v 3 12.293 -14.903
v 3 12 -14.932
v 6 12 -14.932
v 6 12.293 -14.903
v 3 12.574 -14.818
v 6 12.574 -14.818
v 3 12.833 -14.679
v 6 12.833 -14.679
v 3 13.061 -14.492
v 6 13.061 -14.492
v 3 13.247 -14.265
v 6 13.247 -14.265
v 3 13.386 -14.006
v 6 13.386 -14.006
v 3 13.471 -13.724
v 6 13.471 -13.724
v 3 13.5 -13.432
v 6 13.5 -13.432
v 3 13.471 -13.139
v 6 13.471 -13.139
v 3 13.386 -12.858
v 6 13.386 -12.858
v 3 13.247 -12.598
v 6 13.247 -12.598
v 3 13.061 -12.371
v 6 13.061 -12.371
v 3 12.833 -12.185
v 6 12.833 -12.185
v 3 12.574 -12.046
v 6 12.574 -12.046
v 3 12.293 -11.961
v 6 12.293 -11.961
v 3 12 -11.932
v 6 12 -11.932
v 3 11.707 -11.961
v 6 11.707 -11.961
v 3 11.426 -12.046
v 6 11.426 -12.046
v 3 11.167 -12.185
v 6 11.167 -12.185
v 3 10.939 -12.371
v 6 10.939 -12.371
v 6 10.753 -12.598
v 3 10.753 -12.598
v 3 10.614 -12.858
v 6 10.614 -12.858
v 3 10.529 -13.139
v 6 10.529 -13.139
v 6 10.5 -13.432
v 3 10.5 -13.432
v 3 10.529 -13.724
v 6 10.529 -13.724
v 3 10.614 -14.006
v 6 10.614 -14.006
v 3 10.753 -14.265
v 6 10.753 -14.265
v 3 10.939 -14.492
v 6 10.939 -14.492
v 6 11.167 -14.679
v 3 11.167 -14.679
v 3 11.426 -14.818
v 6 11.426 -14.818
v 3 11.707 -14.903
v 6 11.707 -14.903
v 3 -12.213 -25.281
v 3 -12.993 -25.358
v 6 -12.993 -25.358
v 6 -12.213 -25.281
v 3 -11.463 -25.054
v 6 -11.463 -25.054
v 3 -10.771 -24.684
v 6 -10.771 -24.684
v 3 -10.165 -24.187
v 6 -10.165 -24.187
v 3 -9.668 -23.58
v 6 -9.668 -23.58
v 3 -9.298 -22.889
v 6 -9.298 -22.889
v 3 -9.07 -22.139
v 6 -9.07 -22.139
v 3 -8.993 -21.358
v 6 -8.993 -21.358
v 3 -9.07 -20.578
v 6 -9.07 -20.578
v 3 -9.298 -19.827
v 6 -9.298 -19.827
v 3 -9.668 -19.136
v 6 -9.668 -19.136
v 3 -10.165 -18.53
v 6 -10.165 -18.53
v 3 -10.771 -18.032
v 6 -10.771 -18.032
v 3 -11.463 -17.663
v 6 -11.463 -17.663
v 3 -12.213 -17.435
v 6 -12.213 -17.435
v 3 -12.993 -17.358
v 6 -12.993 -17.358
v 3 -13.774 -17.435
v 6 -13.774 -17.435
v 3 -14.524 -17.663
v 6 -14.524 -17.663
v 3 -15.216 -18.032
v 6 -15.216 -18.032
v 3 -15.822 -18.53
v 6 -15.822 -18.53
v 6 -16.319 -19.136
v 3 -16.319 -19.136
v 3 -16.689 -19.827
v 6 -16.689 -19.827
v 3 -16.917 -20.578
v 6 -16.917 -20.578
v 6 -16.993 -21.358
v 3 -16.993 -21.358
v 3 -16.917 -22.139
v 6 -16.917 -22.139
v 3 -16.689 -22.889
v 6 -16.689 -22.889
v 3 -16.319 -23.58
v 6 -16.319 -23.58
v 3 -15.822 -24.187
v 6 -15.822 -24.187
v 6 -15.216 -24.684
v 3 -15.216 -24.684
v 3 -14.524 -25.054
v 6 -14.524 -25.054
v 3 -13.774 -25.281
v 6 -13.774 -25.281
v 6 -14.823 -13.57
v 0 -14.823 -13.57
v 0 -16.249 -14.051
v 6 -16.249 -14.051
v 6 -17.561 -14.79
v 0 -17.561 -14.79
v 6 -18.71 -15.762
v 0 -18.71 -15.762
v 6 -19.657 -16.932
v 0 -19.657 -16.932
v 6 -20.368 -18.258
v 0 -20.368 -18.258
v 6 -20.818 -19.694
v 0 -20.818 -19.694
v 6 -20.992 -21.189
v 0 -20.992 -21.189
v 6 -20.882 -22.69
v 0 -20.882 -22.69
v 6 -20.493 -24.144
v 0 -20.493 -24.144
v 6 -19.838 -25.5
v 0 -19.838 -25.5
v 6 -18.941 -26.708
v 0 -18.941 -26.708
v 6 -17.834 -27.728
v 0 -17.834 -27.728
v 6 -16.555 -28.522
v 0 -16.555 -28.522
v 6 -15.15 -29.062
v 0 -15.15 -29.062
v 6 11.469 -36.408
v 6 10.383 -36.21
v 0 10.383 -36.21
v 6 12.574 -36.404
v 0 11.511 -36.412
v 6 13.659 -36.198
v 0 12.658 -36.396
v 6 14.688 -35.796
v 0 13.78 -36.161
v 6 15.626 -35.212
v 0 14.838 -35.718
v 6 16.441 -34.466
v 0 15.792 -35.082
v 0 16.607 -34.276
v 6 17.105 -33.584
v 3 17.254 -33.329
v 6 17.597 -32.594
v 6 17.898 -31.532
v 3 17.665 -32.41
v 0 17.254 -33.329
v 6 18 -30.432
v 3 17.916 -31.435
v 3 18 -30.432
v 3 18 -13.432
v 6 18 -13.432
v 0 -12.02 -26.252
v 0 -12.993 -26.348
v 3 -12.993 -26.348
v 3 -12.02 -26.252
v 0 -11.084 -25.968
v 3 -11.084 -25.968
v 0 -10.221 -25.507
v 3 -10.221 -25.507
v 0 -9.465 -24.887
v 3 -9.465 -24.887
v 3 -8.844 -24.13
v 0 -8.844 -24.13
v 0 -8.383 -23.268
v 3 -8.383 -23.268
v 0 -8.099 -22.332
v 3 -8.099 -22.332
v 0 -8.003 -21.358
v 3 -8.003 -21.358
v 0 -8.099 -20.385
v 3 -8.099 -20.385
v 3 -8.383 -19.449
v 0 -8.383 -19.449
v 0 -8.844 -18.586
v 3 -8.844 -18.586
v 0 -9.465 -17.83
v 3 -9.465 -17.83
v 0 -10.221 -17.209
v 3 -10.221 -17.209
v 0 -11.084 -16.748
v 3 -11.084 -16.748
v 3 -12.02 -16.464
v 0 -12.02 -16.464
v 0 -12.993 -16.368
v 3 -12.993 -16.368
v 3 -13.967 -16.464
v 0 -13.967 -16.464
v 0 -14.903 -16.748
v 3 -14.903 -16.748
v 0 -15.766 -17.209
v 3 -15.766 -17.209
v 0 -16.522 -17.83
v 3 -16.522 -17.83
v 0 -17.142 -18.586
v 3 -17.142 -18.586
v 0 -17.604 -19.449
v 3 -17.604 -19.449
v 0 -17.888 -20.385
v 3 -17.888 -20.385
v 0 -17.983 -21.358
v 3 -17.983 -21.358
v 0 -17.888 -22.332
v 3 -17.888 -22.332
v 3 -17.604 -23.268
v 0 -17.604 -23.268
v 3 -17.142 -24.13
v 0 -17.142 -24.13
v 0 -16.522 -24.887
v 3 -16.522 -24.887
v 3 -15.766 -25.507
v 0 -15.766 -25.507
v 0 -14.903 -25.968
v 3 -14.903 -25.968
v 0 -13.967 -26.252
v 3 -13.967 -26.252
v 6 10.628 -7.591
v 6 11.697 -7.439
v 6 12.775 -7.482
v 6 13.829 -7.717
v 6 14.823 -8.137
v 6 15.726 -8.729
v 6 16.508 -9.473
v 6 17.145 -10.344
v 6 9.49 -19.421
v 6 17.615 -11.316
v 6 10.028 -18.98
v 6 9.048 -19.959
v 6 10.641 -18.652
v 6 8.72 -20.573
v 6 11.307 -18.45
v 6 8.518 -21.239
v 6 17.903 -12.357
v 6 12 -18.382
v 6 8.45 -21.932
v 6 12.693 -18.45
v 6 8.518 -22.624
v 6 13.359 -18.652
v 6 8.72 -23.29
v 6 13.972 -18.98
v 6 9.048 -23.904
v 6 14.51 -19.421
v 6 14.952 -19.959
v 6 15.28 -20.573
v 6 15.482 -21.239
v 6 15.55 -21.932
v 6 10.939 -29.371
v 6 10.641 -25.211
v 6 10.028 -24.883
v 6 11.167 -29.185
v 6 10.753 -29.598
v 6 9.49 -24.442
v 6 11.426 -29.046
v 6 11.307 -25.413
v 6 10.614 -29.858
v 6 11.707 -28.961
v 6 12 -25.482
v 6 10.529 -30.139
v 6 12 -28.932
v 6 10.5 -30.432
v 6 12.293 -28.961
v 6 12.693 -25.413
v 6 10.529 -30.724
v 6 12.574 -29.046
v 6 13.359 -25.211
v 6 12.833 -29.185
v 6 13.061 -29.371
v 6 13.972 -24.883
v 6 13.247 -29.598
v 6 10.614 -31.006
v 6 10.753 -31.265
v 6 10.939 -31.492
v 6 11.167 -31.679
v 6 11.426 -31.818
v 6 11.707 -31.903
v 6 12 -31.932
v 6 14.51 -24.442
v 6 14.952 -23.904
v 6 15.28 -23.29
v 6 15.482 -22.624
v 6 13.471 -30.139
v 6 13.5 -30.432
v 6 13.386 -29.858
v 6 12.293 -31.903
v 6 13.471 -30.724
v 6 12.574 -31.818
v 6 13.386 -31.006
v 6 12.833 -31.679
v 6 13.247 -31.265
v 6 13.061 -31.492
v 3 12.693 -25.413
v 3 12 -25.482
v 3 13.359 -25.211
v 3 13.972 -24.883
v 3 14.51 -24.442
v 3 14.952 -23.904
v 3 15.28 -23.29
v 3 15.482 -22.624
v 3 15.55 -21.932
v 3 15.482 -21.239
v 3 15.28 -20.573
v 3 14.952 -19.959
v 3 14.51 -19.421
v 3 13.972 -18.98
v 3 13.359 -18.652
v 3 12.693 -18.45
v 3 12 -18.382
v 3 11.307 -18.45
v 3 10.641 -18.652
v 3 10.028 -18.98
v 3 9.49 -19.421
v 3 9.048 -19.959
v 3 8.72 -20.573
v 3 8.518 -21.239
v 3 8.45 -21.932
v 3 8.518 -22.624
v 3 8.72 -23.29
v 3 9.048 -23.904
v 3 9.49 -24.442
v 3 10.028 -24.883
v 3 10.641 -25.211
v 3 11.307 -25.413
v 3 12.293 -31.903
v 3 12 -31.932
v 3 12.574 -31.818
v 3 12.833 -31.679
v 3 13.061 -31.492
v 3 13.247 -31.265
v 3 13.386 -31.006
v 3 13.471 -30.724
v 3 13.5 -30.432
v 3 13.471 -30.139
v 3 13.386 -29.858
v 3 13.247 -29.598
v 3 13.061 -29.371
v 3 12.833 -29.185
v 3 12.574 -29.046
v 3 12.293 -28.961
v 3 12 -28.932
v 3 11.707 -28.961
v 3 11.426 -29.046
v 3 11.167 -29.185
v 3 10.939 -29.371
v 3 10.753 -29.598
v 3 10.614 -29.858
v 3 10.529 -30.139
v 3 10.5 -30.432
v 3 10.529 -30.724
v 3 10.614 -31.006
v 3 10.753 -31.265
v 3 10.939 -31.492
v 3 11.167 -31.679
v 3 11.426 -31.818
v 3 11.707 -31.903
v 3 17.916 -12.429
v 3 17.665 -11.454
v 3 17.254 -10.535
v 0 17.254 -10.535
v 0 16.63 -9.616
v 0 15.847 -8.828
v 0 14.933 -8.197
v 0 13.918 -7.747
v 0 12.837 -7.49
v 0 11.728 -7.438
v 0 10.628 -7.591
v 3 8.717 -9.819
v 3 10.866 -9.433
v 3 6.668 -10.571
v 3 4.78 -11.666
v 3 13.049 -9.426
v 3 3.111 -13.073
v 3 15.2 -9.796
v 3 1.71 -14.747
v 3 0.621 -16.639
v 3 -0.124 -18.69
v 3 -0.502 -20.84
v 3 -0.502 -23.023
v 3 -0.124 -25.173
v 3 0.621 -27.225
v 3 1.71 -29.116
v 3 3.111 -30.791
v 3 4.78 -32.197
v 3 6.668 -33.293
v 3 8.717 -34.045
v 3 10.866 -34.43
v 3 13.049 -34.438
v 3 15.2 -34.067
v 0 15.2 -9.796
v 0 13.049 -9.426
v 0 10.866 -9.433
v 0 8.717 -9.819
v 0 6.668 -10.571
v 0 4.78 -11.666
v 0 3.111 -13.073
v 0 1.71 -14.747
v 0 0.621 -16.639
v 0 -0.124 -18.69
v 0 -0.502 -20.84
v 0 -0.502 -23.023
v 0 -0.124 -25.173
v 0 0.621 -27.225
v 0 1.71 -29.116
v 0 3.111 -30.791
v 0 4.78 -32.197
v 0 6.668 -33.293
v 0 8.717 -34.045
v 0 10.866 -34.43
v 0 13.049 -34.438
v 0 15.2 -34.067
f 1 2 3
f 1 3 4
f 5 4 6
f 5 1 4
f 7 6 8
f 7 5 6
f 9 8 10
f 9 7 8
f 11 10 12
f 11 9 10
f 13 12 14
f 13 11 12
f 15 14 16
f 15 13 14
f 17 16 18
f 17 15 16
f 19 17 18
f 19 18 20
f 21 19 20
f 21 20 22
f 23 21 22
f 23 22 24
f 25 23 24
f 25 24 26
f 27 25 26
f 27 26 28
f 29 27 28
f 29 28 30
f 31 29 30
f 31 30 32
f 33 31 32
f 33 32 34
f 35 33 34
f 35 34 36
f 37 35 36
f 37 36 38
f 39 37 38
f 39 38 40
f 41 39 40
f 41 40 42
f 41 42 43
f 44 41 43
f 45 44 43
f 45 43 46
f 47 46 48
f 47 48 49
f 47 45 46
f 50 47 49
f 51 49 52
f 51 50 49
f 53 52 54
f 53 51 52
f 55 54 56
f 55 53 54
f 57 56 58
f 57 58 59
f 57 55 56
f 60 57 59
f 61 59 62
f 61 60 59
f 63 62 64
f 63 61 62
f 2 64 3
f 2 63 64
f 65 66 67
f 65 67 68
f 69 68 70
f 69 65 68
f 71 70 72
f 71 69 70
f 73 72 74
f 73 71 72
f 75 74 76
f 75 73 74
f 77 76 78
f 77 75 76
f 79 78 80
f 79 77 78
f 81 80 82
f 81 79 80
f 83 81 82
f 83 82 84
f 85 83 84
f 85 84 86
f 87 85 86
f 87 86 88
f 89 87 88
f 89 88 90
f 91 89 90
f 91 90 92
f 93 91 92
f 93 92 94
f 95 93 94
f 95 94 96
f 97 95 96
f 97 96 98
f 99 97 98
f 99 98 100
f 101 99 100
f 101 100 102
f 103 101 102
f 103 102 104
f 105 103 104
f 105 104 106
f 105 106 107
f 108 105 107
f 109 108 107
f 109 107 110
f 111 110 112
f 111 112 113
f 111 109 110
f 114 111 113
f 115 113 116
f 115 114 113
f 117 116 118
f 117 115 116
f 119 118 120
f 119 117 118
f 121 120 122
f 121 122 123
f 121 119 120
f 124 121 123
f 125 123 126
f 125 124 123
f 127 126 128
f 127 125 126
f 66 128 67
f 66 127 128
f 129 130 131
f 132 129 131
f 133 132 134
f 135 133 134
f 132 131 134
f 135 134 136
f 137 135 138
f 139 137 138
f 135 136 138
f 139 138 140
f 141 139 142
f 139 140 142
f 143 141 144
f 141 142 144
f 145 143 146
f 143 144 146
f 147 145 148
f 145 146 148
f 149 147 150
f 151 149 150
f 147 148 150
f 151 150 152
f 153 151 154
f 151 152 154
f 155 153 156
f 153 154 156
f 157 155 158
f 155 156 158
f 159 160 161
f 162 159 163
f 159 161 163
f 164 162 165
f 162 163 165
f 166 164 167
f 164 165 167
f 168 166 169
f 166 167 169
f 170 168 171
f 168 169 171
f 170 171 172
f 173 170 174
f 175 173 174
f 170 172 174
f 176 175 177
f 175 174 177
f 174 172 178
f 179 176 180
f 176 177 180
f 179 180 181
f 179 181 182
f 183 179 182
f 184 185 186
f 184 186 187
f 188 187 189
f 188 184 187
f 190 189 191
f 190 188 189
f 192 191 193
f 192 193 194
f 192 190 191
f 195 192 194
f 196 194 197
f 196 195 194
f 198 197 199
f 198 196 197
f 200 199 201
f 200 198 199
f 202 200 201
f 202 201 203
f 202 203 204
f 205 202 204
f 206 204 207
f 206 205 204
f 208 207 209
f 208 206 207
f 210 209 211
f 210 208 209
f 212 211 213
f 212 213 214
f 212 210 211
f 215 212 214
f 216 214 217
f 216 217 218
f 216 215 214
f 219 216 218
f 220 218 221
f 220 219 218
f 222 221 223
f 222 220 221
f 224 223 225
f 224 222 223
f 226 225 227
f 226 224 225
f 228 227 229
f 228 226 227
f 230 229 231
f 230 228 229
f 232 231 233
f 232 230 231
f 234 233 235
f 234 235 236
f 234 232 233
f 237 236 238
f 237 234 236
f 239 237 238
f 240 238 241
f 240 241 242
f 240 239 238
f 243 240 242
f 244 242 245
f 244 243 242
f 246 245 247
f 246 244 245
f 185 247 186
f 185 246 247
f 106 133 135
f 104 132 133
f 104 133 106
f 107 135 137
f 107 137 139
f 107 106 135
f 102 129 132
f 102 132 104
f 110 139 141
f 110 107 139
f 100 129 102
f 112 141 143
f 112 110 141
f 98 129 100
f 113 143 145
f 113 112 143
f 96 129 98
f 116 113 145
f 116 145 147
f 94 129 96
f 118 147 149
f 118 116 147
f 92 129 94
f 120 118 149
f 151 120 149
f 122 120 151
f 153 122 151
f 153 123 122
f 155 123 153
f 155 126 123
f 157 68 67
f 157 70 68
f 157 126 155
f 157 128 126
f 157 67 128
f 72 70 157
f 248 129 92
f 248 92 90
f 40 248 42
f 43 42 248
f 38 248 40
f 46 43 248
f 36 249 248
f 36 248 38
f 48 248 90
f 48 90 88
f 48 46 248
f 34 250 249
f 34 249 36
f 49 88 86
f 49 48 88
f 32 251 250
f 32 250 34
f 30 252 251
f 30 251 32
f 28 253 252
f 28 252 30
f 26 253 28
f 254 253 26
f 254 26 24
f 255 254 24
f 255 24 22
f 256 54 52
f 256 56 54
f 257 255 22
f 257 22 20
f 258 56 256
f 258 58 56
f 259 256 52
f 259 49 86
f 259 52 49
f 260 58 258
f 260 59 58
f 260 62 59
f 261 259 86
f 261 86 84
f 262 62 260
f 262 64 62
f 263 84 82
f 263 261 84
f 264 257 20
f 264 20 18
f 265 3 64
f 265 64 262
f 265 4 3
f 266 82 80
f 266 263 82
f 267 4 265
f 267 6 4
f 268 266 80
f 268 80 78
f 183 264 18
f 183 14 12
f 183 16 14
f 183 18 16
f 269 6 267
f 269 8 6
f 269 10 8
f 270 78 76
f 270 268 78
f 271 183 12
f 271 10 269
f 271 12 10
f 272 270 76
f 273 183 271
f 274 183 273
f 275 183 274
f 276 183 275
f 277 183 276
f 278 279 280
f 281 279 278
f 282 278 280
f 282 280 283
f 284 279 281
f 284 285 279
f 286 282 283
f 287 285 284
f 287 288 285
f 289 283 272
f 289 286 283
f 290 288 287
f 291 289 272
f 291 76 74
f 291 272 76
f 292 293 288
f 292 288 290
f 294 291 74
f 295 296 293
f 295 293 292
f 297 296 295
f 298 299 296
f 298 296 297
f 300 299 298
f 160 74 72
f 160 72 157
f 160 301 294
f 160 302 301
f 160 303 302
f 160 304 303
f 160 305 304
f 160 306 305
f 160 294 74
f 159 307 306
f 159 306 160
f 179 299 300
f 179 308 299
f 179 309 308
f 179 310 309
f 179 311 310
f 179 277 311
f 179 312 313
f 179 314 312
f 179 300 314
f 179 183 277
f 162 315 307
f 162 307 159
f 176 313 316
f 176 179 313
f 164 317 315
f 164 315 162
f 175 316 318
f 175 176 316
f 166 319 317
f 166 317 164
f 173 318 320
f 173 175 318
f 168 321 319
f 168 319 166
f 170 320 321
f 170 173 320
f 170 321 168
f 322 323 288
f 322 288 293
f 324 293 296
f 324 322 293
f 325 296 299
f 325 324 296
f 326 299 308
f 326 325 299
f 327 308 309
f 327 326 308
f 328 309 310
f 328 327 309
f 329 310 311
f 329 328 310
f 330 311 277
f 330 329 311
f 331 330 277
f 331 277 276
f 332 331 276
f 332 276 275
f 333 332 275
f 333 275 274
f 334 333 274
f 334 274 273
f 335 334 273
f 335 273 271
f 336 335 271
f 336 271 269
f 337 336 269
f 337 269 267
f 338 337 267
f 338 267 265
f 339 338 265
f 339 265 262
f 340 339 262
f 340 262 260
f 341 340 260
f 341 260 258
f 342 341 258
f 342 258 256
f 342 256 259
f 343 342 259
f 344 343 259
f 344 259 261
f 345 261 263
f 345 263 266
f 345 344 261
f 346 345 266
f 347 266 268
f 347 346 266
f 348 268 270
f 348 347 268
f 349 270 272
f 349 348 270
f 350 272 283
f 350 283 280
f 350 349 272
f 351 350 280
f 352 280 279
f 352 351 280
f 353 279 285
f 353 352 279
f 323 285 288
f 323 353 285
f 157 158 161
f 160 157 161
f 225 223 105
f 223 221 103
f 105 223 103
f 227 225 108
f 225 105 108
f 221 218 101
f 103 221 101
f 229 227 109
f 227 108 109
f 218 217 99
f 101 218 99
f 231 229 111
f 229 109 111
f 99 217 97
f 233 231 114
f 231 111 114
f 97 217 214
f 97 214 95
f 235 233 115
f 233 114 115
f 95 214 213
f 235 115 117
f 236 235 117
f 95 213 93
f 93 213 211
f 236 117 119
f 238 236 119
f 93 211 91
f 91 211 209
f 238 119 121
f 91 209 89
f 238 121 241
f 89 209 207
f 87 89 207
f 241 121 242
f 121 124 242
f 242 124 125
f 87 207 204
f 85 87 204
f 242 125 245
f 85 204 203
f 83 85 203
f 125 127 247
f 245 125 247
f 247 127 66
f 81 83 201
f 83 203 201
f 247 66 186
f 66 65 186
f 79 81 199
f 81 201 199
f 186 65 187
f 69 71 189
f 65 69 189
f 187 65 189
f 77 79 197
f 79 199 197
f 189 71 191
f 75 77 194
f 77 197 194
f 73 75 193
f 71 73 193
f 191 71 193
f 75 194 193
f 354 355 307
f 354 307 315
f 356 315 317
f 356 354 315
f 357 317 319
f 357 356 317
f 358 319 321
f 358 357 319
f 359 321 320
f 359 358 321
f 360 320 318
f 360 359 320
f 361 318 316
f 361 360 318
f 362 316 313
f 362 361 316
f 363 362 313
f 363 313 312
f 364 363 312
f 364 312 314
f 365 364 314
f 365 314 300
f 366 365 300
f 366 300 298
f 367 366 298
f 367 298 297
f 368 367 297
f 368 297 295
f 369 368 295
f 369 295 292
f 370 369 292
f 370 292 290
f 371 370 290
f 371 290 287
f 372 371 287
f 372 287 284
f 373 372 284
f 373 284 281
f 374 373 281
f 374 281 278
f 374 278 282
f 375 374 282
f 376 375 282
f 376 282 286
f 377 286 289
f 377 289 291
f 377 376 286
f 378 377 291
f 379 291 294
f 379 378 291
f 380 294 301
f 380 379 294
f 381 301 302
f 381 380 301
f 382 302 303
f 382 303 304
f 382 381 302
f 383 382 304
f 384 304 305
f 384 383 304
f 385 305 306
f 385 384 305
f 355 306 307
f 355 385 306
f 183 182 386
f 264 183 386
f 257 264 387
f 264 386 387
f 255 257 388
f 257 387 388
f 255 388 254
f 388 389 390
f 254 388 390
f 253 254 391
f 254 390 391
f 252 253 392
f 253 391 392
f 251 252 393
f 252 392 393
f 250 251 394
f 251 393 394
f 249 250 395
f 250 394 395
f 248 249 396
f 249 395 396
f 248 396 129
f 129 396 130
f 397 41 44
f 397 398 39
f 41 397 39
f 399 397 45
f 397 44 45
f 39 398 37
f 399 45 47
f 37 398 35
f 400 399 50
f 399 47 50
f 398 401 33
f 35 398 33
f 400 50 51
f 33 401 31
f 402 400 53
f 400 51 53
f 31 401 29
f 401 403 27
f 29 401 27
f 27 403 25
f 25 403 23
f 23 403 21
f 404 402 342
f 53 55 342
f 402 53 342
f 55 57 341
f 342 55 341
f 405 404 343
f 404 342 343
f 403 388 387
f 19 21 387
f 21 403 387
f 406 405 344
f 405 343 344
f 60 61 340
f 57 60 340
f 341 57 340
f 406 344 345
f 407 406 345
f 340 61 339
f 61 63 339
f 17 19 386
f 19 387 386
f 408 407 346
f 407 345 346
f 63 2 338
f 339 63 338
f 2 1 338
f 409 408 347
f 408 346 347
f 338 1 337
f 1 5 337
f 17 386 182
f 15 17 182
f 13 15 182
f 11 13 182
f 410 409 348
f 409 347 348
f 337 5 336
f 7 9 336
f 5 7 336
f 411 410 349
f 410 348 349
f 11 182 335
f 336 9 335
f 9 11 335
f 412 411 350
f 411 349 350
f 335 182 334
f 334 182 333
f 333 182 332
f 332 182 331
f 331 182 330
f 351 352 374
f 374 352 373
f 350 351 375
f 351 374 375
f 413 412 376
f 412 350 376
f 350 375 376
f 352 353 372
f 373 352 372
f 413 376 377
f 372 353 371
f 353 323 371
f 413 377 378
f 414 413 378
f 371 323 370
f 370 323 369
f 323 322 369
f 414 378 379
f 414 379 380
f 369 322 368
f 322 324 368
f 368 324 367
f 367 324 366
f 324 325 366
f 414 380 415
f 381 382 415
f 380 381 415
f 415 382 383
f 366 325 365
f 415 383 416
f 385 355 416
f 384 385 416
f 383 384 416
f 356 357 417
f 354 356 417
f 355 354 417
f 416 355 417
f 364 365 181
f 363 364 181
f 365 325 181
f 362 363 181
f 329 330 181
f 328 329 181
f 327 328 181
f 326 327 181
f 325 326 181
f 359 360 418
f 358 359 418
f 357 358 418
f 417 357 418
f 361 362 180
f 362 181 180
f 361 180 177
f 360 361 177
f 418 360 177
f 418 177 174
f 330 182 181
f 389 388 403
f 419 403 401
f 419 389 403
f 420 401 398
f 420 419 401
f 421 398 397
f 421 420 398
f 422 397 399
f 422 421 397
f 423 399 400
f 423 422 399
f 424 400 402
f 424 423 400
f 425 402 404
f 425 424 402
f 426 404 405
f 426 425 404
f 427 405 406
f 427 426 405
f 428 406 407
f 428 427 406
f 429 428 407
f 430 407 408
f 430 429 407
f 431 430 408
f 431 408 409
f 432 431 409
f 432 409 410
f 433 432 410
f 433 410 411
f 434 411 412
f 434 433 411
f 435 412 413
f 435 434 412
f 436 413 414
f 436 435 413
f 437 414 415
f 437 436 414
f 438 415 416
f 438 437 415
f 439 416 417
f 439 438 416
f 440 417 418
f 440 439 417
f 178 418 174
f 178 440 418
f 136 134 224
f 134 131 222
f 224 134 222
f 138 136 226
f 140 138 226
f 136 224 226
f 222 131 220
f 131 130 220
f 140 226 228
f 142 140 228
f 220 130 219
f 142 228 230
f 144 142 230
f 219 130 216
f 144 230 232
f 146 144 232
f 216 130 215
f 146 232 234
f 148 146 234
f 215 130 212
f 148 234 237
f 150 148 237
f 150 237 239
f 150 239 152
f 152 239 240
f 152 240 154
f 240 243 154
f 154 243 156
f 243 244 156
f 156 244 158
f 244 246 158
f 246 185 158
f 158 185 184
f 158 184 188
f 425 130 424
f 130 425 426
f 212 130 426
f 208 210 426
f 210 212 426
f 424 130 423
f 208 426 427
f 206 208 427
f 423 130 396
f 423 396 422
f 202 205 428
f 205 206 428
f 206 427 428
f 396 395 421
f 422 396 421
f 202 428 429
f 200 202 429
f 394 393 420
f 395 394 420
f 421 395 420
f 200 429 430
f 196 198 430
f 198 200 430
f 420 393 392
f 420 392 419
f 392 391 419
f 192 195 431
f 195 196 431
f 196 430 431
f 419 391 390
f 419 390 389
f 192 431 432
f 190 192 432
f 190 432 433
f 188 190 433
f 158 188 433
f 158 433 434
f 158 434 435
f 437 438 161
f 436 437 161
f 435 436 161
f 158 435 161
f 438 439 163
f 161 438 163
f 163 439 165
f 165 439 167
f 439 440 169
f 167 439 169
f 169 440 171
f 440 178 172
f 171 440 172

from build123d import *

# Parameters (mm, degrees)
SKETCH1_R           = 3.55
SKETCH1_R_2         = 1.5
SKETCH1_R_3         = 4
BOSS_EXTRUDE1_DEPTH = 6
SKETCH2_R           = 4.99
CUT_EXTRUDE1_DEPTH  = 3
SKETCH3_R           = 12.55
CUT_EXTRUDE2_DEPTH  = 3


with BuildPart() as part:
    # Sketch1 → Boss-Extrude1 (new body)
    with BuildSketch(Plane(origin=(0, 0, 0), x_dir=(0, 0, -1), z_dir=(1, 0, 0))):
        with BuildLine():
            Line((30.431712199, 18), (13.431712199, 18))
            ThreePointArc((13.431712199, 18), (8.728856289, 15.726009432), (7.590750373, 10.627715428))
            Line((7.590750373, 10.627715428), (13.570211844, -14.823132675))
            ThreePointArc((13.570211844, -14.823132675), (21.189386747, -20.991639419), (29.061992727, -15.150032042))
            Line((29.061992727, -15.150032042), (36.209586036, 10.382540903))
            ThreePointArc((36.209586036, 10.382540903), (35.212128216, 15.625965073), (30.431712199, 18))
        make_face()
        with Locations((21.931712199, 12)):
            Circle(SKETCH1_R, mode=Mode.SUBTRACT)
        with Locations((30.431712199, 12)):
            Circle(SKETCH1_R_2, mode=Mode.SUBTRACT)
        with Locations((13.431712199, 12)):
            Circle(SKETCH1_R_2, mode=Mode.SUBTRACT)
        with Locations((21.358160945, -12.993419913)):
            Circle(SKETCH1_R_3, mode=Mode.SUBTRACT)
    extrude(amount=BOSS_EXTRUDE1_DEPTH)

    # Sketch2 → Cut-Extrude1 (cut)
    with BuildSketch(Plane(origin=(0, 0, 0), x_dir=(0, 0, -1), z_dir=(1, 0, 0))):
        with Locations((21.358160945, -12.993419913)):
            Circle(SKETCH2_R)
    extrude(amount=CUT_EXTRUDE1_DEPTH, mode=Mode.SUBTRACT)

    # Sketch3 → Cut-Extrude2 (cut)
    with BuildSketch(Plane(origin=(0, 0, 0), x_dir=(0, 0, -1), z_dir=(1, 0, 0))):
        with Locations((21.931712199, 12)):
            Circle(SKETCH3_R)
    extrude(amount=CUT_EXTRUDE2_DEPTH, mode=Mode.SUBTRACT)


solid = part.part
